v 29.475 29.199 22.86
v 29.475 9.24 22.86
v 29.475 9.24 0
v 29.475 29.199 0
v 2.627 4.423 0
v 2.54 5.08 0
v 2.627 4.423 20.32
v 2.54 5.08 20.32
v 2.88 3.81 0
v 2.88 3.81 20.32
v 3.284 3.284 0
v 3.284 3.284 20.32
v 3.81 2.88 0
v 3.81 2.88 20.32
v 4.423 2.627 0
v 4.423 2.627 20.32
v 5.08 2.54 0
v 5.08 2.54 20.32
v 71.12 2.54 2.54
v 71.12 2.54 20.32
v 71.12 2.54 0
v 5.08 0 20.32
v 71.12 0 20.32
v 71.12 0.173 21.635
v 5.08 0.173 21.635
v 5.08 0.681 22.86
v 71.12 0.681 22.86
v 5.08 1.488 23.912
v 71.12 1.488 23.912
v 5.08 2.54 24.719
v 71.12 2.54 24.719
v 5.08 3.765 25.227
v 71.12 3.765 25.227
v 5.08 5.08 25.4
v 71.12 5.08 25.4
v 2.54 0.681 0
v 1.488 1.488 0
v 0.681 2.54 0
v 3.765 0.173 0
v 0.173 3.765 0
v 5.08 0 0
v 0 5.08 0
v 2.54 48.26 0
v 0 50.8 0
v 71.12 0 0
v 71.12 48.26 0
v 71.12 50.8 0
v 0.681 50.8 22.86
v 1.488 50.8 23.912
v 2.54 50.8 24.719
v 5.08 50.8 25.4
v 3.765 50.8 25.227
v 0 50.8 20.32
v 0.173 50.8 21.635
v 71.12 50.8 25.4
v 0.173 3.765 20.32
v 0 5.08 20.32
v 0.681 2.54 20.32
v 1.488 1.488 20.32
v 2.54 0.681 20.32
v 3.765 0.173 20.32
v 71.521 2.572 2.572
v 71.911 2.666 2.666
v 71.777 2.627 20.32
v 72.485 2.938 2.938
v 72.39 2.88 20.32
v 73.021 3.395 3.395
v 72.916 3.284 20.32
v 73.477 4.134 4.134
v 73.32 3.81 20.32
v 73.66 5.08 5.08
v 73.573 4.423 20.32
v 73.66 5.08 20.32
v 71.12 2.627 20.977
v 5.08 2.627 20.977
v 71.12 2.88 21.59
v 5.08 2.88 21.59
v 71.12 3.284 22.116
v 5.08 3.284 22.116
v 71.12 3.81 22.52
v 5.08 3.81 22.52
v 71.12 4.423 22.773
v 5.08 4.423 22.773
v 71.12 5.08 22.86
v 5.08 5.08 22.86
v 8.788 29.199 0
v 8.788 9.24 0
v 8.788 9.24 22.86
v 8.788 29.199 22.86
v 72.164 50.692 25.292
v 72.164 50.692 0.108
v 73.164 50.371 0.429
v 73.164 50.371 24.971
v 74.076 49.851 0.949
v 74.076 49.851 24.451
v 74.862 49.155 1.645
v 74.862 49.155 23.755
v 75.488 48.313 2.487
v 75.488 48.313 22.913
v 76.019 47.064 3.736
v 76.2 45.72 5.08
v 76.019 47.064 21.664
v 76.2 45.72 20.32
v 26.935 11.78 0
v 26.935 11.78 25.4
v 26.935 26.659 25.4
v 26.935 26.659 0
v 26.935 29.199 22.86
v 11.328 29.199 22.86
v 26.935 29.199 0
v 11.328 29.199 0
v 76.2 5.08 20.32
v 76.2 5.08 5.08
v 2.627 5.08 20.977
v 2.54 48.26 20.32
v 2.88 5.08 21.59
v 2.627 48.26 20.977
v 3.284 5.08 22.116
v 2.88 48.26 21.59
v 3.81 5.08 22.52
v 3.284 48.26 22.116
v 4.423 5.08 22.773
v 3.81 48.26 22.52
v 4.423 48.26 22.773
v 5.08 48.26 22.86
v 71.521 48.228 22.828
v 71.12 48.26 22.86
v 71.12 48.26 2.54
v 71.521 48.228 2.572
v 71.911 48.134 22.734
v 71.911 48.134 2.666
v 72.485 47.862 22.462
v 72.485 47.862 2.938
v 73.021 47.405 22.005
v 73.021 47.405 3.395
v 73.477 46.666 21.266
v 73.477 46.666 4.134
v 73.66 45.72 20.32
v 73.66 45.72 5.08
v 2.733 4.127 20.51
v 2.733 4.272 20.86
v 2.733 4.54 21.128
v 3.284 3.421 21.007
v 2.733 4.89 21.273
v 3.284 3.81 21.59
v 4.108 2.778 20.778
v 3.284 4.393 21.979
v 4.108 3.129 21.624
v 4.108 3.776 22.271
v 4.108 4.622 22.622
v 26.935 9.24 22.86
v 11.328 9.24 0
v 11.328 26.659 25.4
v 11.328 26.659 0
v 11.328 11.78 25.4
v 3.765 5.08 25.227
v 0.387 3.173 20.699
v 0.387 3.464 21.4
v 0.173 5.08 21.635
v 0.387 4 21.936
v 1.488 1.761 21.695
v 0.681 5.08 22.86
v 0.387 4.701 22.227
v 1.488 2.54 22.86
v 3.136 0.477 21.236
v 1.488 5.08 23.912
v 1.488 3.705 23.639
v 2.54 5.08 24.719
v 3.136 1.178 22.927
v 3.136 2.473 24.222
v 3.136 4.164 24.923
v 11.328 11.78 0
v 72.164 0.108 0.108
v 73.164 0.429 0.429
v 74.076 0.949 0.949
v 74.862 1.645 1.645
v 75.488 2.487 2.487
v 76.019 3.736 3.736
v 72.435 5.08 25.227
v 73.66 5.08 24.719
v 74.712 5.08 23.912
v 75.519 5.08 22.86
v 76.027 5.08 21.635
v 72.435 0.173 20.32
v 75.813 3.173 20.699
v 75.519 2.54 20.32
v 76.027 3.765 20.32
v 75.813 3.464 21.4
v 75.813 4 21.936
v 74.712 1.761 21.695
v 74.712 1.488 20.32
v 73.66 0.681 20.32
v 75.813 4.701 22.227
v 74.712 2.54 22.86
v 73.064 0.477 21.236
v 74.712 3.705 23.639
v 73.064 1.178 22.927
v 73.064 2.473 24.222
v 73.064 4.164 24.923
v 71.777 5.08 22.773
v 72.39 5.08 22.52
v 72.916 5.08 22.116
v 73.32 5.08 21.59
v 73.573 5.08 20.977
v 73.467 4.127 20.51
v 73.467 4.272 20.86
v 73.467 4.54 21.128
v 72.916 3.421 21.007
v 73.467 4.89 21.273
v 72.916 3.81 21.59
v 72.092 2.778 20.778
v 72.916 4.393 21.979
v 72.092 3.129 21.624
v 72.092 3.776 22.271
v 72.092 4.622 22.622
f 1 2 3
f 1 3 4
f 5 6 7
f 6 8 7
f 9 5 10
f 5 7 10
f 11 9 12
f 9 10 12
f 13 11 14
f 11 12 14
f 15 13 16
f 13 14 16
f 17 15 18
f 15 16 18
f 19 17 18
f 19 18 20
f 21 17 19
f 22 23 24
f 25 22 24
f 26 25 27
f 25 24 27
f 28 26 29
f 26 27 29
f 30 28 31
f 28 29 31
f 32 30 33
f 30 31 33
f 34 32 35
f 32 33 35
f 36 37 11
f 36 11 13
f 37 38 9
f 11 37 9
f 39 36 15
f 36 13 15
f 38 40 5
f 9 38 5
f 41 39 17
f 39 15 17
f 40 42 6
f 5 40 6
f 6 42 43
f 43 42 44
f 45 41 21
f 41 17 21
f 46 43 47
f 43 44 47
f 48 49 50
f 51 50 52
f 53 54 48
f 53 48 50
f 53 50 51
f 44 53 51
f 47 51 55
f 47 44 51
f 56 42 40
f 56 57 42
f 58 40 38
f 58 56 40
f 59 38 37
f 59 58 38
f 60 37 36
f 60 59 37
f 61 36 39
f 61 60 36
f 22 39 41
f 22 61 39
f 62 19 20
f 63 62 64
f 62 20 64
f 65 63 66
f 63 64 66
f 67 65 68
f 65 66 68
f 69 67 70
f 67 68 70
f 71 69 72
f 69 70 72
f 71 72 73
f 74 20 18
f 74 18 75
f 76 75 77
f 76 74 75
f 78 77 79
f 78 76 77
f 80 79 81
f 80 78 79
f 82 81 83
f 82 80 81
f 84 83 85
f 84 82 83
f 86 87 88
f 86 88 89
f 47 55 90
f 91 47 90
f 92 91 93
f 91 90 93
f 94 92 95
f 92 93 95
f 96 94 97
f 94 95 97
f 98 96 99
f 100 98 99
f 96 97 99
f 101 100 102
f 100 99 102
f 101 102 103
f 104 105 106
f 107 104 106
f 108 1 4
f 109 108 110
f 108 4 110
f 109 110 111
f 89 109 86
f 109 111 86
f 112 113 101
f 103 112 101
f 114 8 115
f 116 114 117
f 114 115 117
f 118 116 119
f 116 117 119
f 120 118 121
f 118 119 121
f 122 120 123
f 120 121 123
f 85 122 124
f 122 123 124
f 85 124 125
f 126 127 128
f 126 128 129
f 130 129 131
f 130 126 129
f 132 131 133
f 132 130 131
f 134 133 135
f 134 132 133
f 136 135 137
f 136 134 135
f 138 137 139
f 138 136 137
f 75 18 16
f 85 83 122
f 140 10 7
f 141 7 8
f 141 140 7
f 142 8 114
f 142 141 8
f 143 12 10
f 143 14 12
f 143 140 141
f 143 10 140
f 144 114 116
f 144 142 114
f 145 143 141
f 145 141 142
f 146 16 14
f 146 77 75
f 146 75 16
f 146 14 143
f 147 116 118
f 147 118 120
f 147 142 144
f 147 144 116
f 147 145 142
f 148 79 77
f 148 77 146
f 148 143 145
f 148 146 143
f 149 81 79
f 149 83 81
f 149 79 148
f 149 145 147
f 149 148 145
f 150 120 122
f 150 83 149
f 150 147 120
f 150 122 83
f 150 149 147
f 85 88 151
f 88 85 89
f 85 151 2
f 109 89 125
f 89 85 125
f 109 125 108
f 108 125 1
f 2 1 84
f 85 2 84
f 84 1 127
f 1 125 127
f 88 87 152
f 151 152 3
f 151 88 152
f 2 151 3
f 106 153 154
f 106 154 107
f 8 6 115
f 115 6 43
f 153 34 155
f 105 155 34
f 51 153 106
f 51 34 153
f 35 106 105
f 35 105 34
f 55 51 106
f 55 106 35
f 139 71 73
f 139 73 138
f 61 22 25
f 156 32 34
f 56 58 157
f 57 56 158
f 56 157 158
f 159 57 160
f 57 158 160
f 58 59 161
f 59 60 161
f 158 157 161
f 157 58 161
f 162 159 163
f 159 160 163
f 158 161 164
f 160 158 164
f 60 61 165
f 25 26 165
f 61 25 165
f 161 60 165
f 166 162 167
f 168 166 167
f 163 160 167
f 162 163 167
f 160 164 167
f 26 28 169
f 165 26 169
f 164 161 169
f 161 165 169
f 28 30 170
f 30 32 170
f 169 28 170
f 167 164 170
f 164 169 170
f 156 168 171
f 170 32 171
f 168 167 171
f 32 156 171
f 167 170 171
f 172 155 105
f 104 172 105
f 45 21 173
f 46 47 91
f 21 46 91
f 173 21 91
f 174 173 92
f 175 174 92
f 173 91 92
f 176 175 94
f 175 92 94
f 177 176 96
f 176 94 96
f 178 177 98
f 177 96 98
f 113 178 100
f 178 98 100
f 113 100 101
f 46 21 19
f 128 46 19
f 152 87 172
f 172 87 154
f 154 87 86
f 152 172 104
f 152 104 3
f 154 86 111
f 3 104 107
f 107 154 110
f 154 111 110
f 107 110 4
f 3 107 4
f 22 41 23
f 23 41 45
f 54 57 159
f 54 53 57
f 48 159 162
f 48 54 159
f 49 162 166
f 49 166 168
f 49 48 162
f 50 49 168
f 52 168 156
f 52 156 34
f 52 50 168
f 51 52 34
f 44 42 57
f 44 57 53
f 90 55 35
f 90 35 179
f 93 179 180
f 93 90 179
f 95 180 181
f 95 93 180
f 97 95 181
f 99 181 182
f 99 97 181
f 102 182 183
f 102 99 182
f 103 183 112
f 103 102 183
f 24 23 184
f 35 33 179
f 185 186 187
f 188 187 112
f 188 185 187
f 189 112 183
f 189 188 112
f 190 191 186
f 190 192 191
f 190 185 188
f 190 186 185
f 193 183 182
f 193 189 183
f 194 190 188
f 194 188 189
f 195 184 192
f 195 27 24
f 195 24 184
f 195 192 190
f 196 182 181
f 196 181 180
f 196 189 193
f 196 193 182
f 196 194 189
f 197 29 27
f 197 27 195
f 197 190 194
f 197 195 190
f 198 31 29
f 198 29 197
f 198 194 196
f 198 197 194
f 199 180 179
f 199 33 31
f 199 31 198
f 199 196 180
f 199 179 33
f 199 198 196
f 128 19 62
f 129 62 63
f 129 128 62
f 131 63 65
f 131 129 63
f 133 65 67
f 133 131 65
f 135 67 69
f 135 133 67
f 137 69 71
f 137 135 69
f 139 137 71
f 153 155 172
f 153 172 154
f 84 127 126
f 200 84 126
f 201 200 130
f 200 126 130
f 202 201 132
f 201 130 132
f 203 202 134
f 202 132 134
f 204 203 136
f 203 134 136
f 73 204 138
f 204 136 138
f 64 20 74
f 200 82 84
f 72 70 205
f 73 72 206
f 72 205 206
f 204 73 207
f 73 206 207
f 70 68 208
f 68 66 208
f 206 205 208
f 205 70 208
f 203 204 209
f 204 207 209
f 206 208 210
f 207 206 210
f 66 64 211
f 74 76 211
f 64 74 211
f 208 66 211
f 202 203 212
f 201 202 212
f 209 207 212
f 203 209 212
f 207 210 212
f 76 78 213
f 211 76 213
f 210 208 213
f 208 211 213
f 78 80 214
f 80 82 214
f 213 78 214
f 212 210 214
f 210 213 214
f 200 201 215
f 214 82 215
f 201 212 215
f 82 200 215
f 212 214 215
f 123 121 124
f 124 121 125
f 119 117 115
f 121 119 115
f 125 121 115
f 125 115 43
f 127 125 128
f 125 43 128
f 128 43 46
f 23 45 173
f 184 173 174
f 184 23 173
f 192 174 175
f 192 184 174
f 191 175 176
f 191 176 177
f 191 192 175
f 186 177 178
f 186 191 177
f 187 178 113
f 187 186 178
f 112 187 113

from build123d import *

# Parameters (mm, degrees)
F0_W        = 76.2
F0_H        = 50.8
F1_DEPTH    = 25.4
F2_W        = 15.6074212864
F2_H        = 14.8792807013
F3_DEPTH    = 25.4
F4_R        = 5.08
F5_T        = 2.54
F5_T3_DEPTH = 30.48


# Not quite as in the source:
# - a shell that OpenCascade refuses in one call is made with other operations: the cavity is built on its own and cut out


with BuildPart() as f1:
    # F0 (on Top) → F1 (new body)
    with BuildSketch(Plane.XY):
        with Locations((38.1, 25.4)):
            Rectangle(F0_W, F0_H)
    extrude(amount=F1_DEPTH)

    # F2 (on face) → F3 (cut, through all)
    with BuildSketch(Plane.XY.offset(25.4)):
        with Locations((19.1314755939, 19.2197160795)):
            Rectangle(F2_W, F2_H)
    extrude(amount=-F3_DEPTH, mode=Mode.SUBTRACT)

    # F4
    f4_edges = [f1.edges().sort_by_distance(p)[0] for p in [
        (38.1, 0, 25.4),
        (76.2, 0, 12.7),
        (76.2, 50.8, 12.7),
        (76.2, 25.4, 0),
        (76.2, 25.4, 25.4),
        (0, 0, 12.7),
        (0, 25.4, 25.4),
    ]]
    fillet(f4_edges, radius=F4_R)

    # F5: shell of thickness 2.54, made by hand


with BuildPart() as f5_core1:
    # F5_t2: copy of F1
    add(f1.part)

    # the walls: a layer under each face that stays
    f5_faces = [f5_core1.faces().sort_by_distance(p)[0] for p in [
        (0, 27.94, 10.16),
        (35.56, 50.8, 12.7),
        (1.4878975516, 27.94, 23.9121024484),
        (1.4878975516, 1.4878975516, 10.16),
        (38.1, 27.94, 25.4),
        (74.7121026222, 49.3121022747, 12.7),
        (1.4878975516, 2.54, 22.86),
        (38.1, 0, 10.16),
        (74.7121025744, 25.4, 1.4878976776),
        (11.3277649507, 19.2197160795, 12.7),
        (19.1314755939, 11.7800757289, 12.7),
        (26.9351862371, 19.2197160795, 12.7),
        (19.1314755939, 26.6593564302, 12.7),
        (74.7121026222, 27.94, 23.9121022747),
        (38.1, 1.4878975516, 23.9121024484),
        (76.2, 25.4, 12.7),
        (74.7121024484, 1.4878975516, 10.16),
        (74.7121024484, 2.54, 22.86),
    ]]
    thicken(f5_faces, amount=-F5_T, mode=Mode.SUBTRACT)

    # F5_s4 → F5_t3 (cut)
    with BuildSketch(Plane.XY.offset(-2.54)):
        Polygon((11.3531649507, 26.6339564302), (8.7877649507, 26.6593564302), (8.7877649507, 29.1993564302), (11.3277649507, 29.1993564302), align=None)
        Polygon((11.3531649507, 11.8054757289), (8.7877649507, 11.7800757289), (8.7877649507, 9.2400757289), (11.3277649507, 9.2400757289), align=None)
        Polygon((26.9097862371, 11.8054757289), (26.9351862371, 9.2400757289), (29.4751862371, 9.2400757289), (29.4751862371, 11.7800757289), align=None)
        Polygon((26.9097862371, 26.6339564302), (29.4751862371, 26.6593564302), (29.4751862371, 29.1993564302), (26.9351862371, 29.1993564302), align=None)
    extrude(amount=F5_T3_DEPTH, mode=Mode.SUBTRACT)


with BuildPart() as f1_1:
    add(f1.part)

    # what is left inside the walls is the cavity
    f5_cavity = [f5_core1.part.solids().sort_by_distance(p)[0] for p in [
        (36.83, 17.78, 0.0254),
    ]]
    add(f5_cavity, mode=Mode.SUBTRACT)


solid = f1_1.part
